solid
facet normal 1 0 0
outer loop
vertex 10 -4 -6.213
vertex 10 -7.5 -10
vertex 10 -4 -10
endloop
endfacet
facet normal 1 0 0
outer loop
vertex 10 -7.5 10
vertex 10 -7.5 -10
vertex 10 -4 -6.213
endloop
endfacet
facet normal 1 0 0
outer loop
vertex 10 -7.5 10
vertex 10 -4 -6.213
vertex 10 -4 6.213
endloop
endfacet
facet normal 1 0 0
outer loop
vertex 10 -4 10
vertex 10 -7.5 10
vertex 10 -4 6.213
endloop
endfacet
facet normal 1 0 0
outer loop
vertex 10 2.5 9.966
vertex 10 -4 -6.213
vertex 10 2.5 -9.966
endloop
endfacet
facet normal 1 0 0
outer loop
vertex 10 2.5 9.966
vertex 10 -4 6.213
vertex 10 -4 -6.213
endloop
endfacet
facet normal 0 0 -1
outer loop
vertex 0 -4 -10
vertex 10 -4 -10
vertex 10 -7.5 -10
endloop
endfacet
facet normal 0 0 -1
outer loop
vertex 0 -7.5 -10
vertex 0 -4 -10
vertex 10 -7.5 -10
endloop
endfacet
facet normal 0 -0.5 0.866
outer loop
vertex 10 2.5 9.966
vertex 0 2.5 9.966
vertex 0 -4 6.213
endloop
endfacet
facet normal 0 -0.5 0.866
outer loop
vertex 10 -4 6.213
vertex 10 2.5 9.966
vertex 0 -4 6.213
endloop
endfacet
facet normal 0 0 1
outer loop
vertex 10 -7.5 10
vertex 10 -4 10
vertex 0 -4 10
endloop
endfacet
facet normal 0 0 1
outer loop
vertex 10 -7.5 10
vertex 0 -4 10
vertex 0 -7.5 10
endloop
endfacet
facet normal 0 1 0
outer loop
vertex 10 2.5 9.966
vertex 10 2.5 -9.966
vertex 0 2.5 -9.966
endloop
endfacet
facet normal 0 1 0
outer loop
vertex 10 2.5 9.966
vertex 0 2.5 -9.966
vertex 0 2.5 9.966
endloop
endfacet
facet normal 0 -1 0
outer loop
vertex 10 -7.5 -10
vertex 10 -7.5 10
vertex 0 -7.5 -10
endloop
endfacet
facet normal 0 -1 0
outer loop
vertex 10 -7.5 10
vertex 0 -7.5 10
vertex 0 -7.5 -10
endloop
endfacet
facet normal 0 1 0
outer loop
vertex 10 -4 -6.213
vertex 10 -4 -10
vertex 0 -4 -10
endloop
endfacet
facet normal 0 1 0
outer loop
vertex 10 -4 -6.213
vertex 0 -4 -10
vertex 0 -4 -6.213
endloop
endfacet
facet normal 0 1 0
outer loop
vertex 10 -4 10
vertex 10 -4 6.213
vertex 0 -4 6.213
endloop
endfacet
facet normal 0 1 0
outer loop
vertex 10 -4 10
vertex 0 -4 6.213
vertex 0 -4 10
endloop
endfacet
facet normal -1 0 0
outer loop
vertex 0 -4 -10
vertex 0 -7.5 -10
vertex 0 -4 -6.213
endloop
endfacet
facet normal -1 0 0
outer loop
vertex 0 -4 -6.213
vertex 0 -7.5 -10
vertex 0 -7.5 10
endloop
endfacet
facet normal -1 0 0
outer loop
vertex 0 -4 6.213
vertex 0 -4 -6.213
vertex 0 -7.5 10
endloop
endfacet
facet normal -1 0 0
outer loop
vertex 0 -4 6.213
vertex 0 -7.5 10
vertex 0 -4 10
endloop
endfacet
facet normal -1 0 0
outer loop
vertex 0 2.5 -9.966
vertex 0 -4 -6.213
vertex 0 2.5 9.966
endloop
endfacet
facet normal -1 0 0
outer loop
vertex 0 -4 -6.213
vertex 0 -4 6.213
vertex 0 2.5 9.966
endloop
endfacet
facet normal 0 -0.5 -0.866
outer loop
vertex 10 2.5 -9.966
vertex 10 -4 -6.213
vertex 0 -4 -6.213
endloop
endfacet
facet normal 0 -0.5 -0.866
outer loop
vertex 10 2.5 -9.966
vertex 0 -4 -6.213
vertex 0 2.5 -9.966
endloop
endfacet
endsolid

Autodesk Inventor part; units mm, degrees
ref_plane "YZ Plane" through (0, 0, 0) normal (1, 0, 0) x (0, 1, 0)
ref_plane "XZ Plane" through (0, 0, 0) normal (0, 1, 0) x (-1, 0, 0)
ref_plane "XY Plane" through (0, 0, 0) normal (0, 0, 1) x (1, 0, 0)
sketch "Sketch1" plane through (0, 0, 0) normal (1, 0, 0) x (0, 1, 0)
  line L0 (-7.5, -12.5) -> (7.5, -12.5)
  line L1 (7.5, -12.5) -> (7.5, 12.5)
  line L2 (7.5, 12.5) -> (-7.5, 12.5)
  line L3 (-7.5, 12.5) -> (-7.5, -12.5)
  line L4 (-7.5, -12.5) -> (7.5, 12.5) construction
  line L5 (7.5, -12.5) -> (-7.5, 12.5) construction
  point P0 (0, 0)
  dimension "d0" = 25
  dimension "d1" = 15
extrude "Extrusion1" add sketch "Sketch1" along normal blind 10
sketch "Sketch2" plane through (10, 0, 0) normal (1, 0, 0) x (0, 0, -1)
  line L0 (10, -7.5) -> (22, -7.5) projected
  line L1 (22, 12.5) -> (22, -7.5) projected
  line L2 (-35, 12.5) -> (22, 12.5) projected
  line L3 (-35, 12.5) -> (-35, 59.5) projected
  line L4 (-45, 59.5) -> (-35, 59.5) projected
  line L5 (-45, 59.5) -> (-45, -7.5) projected
  line L6 (-45, -7.5) -> (-10, -7.5) projected
  line L7 (-9.5, -7.5) -> (9.5, -7.5)
  line L8 (-10, -7.1) -> (-44.6, -7.1)
  line L9 (-44.6, -7.1) -> (-44.6, 59.1)
  line L10 (-44.6, 59.1) -> (-35.4, 59.1)
  line L11 (-35.4, 59.1) -> (-35.4, 12.1)
  line L12 (-35.4, 12.1) -> (21.6, 12.1)
  line L13 (21.6, 12.1) -> (21.6, -7.1)
  line L14 (21.6, -7.1) -> (10, -7.1)
  line L15 (10, -7.1) -> (10, -4)
  line L16 (10, -4) -> (6.2132, -4)
  line L17 (6.2132, -4) -> (9.966, 2.5)
  line L18 (9.966, 2.5) -> (-9.966, 2.5)
  line L19 (-9.966, 2.5) -> (-6.2132, -4)
  line L20 (-6.2132, -4) -> (-10, -4)
  line L21 (-10, -4) -> (-10, -7.1)
  line L22 (-10, -7.1) -> (-10, -7.5)
  line L23 (-12.5, -7.5) -> (12.5, -7.5) projected
  line L24 (10, -7.1) -> (10, -7.5)
  line L25 (-12.5, -7.5) -> (12.5, -7.5) projected
  circle A0 centre (-23.999, -0.85) radius 1.5 projected
  line L26 (-10, -7.5) -> (-10, -4) projected
  line L27 (-10, -4) -> (-6.2132, -4) projected
  line L28 (-6.2132, -4) -> (-9.966, 2.5) projected
  line L29 (-9.966, 2.5) -> (9.966, 2.5) projected
  line L30 (9.966, 2.5) -> (6.2132, -4) projected
  line L31 (6.2132, -4) -> (10, -4) projected
  line L32 (10, -4) -> (10, -7.5) projected
  point P0 (0, 0)
extrude "Extrusion2" cut sketch "Sketch2" against normal blind 10 contours L24 L14 L13 L12 L11 L10 L9 L8 L22 L6 L5 L4 L3 L2 L1 L0 | L15 L16 L17 L18 L19 L20 L21 L8 L9 L10 L11 L12 L13 L14 | A0
properties part number "tester"
